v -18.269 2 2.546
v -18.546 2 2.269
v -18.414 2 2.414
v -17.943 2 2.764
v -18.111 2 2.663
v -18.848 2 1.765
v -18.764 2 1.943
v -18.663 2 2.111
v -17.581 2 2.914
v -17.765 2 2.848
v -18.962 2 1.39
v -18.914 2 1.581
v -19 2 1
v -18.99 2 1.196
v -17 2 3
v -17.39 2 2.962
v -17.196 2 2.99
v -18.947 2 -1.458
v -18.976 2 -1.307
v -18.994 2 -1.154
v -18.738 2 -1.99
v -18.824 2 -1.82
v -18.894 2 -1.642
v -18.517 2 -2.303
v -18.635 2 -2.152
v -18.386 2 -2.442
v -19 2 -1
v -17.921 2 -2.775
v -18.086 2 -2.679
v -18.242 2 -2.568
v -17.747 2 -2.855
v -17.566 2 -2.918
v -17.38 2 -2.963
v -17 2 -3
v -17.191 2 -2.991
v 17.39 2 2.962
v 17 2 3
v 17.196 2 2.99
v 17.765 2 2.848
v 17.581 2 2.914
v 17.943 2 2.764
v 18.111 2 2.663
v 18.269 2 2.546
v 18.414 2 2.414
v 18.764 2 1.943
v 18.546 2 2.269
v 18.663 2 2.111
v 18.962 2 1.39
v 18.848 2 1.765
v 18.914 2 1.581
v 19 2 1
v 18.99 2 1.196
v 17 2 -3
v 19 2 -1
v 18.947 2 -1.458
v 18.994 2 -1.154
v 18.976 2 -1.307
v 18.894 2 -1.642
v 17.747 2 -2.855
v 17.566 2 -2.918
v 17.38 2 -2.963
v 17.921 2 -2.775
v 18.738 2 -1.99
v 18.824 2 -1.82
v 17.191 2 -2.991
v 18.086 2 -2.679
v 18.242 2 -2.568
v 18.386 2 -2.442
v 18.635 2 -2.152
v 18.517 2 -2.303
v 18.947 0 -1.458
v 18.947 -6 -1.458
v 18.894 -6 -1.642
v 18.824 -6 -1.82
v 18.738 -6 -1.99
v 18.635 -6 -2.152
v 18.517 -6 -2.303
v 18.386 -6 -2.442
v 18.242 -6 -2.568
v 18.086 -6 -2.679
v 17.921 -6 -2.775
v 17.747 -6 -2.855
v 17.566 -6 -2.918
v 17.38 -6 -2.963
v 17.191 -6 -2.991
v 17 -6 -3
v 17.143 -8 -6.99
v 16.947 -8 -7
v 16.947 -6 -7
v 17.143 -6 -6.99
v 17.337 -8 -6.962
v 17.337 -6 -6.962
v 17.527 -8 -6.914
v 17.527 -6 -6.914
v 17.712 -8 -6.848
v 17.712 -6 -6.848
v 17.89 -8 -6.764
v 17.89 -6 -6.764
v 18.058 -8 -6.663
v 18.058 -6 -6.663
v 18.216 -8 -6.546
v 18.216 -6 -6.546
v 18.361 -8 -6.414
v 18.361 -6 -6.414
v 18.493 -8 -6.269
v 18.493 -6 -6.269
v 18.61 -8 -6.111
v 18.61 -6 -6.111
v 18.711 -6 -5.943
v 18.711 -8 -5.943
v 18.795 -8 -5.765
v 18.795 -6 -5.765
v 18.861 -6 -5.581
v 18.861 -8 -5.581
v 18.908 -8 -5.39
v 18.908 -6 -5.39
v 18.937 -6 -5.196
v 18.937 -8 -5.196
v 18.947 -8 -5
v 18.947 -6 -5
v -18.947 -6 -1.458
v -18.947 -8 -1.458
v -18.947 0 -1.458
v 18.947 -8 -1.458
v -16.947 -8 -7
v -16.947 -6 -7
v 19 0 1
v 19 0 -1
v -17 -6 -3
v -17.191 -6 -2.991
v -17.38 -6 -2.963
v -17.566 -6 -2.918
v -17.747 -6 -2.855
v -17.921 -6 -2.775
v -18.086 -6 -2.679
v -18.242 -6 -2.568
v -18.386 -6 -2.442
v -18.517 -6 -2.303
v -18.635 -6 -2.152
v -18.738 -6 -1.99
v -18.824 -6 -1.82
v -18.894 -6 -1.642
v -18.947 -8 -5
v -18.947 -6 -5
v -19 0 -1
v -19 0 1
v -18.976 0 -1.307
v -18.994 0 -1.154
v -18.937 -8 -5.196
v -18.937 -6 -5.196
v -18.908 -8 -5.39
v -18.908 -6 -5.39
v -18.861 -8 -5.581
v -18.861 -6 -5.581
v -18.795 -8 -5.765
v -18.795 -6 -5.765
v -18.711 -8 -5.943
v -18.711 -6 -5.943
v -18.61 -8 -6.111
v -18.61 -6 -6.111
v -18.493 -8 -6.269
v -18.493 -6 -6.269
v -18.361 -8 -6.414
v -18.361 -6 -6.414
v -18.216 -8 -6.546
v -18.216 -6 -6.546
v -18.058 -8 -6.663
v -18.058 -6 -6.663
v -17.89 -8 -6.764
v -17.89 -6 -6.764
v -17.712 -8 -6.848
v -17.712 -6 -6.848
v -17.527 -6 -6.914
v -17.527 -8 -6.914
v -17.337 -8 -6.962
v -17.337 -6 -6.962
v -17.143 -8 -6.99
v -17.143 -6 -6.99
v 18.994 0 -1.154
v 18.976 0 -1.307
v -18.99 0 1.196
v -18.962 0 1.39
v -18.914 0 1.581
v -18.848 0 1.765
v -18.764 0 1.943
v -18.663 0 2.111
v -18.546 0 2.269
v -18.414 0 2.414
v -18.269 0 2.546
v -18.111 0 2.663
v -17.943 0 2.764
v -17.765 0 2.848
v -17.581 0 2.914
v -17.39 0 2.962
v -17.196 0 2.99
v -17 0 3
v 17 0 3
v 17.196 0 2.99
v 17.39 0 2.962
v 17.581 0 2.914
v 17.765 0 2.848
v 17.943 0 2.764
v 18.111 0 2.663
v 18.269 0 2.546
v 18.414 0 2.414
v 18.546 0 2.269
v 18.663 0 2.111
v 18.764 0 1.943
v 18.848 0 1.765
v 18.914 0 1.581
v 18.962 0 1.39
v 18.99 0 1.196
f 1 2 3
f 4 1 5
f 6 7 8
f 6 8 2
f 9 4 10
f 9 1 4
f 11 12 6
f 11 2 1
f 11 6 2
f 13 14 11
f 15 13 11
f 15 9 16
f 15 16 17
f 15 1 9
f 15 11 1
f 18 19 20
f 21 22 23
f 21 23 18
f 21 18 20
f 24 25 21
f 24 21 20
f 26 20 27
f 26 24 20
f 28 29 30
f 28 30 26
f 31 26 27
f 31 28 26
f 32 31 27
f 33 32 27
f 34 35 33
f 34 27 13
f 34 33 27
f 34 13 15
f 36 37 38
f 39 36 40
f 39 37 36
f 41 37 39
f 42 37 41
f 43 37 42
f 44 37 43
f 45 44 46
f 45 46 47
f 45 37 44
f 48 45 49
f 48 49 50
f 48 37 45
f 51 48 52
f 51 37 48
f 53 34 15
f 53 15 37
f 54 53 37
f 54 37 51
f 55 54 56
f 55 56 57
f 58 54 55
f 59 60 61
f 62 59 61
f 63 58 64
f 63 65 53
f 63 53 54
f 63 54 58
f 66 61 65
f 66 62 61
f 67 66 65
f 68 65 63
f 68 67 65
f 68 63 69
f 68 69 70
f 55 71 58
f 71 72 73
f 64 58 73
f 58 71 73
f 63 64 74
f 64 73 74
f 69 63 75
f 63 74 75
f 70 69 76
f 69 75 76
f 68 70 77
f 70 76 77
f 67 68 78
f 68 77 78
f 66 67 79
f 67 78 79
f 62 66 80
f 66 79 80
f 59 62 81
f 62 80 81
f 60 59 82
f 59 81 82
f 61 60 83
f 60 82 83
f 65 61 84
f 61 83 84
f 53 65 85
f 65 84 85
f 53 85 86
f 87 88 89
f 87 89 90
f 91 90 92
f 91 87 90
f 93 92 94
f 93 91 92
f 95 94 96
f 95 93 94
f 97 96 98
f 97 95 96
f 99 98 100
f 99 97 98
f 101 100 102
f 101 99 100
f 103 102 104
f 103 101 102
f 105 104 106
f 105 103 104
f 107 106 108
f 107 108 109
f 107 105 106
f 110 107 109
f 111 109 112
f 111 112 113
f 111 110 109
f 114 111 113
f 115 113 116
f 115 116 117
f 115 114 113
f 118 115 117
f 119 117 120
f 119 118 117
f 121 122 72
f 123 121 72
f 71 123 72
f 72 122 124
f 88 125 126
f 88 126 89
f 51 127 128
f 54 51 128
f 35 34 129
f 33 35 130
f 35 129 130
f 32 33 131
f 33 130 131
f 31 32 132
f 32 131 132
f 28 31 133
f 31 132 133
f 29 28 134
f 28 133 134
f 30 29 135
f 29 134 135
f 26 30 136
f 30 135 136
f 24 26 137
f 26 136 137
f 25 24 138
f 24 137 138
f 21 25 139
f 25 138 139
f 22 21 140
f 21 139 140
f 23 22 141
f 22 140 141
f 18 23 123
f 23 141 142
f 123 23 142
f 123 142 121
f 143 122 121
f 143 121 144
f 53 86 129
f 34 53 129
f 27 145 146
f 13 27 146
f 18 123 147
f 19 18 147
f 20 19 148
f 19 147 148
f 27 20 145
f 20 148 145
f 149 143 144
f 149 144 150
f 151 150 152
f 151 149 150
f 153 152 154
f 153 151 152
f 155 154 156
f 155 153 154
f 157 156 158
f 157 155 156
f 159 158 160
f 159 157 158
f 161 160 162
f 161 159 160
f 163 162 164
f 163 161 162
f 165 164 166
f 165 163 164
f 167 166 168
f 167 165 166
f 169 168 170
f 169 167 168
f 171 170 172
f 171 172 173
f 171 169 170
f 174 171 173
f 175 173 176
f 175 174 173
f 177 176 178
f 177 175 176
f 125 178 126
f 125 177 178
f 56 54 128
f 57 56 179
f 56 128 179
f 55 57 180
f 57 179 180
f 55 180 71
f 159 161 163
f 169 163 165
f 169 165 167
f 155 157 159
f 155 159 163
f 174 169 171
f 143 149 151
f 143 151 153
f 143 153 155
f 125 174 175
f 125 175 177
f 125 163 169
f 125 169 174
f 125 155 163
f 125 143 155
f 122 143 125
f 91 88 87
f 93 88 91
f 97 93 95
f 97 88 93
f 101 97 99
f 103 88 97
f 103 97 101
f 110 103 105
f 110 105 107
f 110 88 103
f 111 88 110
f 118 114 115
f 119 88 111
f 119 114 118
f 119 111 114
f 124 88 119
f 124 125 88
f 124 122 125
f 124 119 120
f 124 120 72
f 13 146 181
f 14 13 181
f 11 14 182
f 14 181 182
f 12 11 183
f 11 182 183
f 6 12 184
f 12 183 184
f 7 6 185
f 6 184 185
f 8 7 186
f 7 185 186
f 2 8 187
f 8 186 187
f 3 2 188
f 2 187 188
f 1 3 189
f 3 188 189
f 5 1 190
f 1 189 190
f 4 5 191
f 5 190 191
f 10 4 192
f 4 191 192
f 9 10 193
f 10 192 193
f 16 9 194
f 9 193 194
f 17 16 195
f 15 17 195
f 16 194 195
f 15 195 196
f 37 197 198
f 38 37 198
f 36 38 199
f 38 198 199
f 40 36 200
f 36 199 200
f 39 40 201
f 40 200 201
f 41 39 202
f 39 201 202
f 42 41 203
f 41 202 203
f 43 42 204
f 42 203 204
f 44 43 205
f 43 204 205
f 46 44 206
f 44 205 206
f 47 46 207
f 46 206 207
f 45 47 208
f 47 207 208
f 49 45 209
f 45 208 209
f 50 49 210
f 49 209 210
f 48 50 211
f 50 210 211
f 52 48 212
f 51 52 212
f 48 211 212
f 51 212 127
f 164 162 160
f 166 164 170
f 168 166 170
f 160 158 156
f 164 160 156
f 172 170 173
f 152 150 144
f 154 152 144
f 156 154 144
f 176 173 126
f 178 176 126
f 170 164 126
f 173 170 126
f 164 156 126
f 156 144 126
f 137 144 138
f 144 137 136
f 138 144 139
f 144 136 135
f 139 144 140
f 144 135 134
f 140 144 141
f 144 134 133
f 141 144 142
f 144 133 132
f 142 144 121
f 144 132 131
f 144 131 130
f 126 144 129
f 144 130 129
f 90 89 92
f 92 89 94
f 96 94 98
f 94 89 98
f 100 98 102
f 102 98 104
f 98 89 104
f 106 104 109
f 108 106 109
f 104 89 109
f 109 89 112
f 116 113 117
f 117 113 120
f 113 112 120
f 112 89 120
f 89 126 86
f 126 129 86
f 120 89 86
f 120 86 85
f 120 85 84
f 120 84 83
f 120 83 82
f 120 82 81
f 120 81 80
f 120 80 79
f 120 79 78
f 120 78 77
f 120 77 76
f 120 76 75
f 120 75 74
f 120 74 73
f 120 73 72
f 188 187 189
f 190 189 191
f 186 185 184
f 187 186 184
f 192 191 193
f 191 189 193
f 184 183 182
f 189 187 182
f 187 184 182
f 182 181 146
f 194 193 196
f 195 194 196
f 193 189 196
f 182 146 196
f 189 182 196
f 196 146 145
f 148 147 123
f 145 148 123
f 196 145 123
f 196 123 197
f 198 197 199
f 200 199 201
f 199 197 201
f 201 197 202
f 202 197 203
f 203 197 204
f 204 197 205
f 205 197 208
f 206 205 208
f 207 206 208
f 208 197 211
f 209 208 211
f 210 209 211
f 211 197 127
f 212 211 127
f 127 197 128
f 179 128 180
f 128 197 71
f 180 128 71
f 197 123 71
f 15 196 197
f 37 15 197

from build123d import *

# Parameters (mm, degrees)
BOSS_EXTRUDE1_DEPTH = 2
BOSS_EXTRUDE2_START = -10
BOSS_EXTRUDE2_DEPTH = 10
BOSS_EXTRUDE3_DEPTH = 2


with BuildPart() as part:
    # Sketch1 → Boss-Extrude1 (new body)
    with BuildSketch(Plane(origin=(0, 0, 0), x_dir=(1, 0, 0), z_dir=(0, 1, 0))):
        with BuildLine():
            Line((-17, -3), (17, -3))
            ThreePointArc((17, -3), (18.414213562, -2.414213562), (19, -1))
            Line((19, -1), (19, 1))
            ThreePointArc((19, 1), (18.414213562, 2.414213562), (17, 3))
            Line((17, 3), (-17, 3))
            ThreePointArc((-17, 3), (-18.414213562, 2.414213562), (-19, 1))
            Line((-19, 1), (-19, -1))
            ThreePointArc((-19, -1), (-18.414213562, -2.414213562), (-17, -3))
        make_face()
    extrude(amount=BOSS_EXTRUDE1_DEPTH)

    # Sketch2 → Boss-Extrude2 (add)
    with BuildSketch(Plane(origin=(0, 2, 0), x_dir=(1, 0, 0), z_dir=(0, 1, 0)).offset(BOSS_EXTRUDE2_START)):
        with BuildLine():
            Line((17, 3), (-17, 3))
            ThreePointArc((-17, 3), (-18.241842888, 2.567745592), (-18.946893714, 1.457826241))
            Line((-18.946893714, 1.457826241), (18.946893714, 1.457826241))
            ThreePointArc((18.946893714, 1.457826241), (18.241842888, 2.567745592), (17, 3))
        make_face()
    extrude(amount=BOSS_EXTRUDE2_DEPTH)

    # Sketch4 → Boss-Extrude3 (add)
    with BuildSketch(Plane.XZ.offset(8)):
        with BuildLine():
            Line((-18.946893714, -1.457826241), (-18.946893714, -5))
            ThreePointArc((-18.946893714, -5), (-18.361107276, -6.414213562), (-16.946893714, -7))
            Line((-16.946893714, -7), (16.946893714, -7))
            ThreePointArc((16.946893714, -7), (18.361107276, -6.414213562), (18.946893714, -5))
            Line((18.946893714, -5), (18.946893714, -1.457826241))
            ThreePointArc((18.946893714, -1.457826241), (18.241842888, -2.567745592), (17, -3))
            Line((17, -3), (-17, -3))
            ThreePointArc((-17, -3), (-18.241842888, -2.567745592), (-18.946893714, -1.457826241))
        make_face()
    extrude(amount=-BOSS_EXTRUDE3_DEPTH)


solid = part.part
